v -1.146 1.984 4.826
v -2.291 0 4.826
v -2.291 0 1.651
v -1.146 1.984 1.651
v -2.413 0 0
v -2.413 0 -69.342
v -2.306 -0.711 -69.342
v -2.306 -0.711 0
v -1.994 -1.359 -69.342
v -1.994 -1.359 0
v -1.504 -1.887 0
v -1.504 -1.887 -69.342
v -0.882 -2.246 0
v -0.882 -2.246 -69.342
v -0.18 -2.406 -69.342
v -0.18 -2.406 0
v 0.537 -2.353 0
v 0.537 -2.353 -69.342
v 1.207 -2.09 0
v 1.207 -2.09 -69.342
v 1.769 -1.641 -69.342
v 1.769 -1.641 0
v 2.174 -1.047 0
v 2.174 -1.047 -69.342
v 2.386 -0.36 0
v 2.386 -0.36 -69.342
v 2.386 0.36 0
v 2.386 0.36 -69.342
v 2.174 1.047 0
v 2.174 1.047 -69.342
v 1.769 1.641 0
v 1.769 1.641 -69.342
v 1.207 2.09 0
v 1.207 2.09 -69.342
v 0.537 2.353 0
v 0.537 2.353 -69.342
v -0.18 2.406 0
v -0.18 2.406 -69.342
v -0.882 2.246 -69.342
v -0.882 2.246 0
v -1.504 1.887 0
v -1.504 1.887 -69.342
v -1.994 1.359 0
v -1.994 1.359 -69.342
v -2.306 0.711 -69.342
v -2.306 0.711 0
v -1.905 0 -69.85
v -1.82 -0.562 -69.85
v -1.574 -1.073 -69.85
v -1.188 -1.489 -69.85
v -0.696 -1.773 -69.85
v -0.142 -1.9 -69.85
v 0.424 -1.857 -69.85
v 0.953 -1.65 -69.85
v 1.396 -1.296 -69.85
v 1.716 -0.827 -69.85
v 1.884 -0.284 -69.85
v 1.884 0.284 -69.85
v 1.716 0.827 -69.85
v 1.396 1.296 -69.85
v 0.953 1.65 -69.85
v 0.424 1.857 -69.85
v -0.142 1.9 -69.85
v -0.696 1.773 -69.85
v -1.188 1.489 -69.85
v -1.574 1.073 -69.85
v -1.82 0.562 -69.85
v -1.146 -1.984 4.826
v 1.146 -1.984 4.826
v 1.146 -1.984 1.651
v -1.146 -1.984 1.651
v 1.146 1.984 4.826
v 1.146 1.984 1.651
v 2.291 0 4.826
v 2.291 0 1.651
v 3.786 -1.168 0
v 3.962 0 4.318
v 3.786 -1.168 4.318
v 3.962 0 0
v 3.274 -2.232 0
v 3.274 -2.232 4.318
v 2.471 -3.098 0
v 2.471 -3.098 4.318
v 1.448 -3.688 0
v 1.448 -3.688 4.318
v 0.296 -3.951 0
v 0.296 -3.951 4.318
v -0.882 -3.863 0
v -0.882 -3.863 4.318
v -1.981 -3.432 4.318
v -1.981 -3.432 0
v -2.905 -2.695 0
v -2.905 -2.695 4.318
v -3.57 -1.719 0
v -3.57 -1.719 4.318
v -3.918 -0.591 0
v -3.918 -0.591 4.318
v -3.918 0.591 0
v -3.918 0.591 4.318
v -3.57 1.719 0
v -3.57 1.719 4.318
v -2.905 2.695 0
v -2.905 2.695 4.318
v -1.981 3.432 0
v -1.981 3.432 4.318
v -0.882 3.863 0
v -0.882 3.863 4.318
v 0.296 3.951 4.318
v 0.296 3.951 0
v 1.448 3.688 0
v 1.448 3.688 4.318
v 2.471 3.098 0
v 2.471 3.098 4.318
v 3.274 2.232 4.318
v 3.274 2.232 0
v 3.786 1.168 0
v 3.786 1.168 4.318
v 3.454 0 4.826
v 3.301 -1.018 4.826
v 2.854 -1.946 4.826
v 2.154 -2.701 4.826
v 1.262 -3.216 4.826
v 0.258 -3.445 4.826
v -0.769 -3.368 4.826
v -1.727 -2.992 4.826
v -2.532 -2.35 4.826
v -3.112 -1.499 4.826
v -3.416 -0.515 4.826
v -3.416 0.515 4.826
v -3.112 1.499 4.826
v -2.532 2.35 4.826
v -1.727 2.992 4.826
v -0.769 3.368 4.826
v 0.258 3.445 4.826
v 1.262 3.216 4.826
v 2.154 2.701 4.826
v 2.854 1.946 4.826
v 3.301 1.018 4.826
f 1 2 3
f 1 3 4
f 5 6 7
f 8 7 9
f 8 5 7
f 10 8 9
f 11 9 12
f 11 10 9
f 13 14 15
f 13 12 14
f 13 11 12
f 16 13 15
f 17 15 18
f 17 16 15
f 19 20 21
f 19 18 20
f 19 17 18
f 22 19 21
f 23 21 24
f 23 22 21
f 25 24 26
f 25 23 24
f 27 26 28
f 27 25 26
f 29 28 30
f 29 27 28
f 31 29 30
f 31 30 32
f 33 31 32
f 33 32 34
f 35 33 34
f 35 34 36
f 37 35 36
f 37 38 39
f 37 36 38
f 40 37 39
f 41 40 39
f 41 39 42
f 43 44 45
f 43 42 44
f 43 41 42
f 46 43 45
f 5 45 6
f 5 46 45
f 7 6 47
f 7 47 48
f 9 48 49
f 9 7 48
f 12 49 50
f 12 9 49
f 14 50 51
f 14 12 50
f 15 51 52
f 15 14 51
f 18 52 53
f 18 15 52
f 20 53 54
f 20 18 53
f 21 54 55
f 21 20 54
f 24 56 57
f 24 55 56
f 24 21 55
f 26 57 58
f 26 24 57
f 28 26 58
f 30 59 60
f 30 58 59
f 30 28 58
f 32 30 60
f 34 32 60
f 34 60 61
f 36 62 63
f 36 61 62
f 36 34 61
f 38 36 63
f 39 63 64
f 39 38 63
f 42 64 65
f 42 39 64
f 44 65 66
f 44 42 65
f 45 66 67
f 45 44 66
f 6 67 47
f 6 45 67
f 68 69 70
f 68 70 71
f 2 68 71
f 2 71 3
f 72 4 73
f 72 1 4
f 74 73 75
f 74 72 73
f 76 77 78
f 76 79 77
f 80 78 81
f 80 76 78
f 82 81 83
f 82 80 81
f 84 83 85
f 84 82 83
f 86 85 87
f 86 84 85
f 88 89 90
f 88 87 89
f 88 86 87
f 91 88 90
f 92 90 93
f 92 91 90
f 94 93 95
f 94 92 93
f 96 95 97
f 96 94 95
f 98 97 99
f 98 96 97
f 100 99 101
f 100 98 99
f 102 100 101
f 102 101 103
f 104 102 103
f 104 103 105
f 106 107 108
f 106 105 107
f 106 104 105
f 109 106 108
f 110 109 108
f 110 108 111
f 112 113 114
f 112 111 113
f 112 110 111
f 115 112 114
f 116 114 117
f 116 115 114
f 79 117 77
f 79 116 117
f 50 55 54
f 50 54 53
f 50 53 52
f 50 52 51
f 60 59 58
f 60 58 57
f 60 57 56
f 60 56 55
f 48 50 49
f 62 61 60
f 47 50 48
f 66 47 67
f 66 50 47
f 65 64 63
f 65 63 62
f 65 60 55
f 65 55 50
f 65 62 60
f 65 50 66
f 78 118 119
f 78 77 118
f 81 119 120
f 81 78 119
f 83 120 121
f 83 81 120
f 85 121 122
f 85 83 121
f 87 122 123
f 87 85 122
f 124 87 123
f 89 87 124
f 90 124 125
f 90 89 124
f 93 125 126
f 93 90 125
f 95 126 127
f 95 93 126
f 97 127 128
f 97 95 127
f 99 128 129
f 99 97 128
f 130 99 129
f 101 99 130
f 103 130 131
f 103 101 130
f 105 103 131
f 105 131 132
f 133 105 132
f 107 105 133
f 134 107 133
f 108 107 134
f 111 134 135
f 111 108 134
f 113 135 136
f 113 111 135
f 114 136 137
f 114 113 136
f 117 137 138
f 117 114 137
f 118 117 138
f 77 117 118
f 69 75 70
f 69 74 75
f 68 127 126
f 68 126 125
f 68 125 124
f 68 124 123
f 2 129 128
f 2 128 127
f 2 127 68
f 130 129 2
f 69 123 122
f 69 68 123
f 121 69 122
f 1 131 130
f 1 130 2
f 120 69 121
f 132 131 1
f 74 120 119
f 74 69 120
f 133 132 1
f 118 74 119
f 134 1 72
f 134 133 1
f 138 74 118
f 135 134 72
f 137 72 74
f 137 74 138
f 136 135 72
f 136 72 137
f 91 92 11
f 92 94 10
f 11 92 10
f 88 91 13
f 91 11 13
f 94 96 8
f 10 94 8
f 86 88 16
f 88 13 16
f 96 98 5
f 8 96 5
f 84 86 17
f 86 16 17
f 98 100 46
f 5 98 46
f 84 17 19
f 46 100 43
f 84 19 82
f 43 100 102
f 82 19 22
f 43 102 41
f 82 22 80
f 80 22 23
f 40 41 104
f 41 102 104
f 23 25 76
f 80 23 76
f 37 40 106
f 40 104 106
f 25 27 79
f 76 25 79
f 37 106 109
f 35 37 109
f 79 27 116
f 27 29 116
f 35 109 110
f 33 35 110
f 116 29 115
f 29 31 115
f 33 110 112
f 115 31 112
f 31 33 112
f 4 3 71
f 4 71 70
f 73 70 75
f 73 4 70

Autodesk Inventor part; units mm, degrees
ref_plane "YZ Plane" through (0, 0, 0) normal (1, 0, 0) x (0, 1, 0)
ref_plane "XZ Plane" through (0, 0, 0) normal (0, 1, 0) x (-1, 0, 0)
ref_plane "XY Plane" through (0, 0, 0) normal (0, 0, 1) x (1, 0, 0)
sketch "Sketch1" plane through (0, 0, 0) normal (0, 0, 1) x (1, 0, 0)
  circle A0 centre (0, 0) radius 3.9624
  dimension "d0" = 7.9248
extrude "Extrusion1" add sketch "Sketch1" along normal blind 4.826
sketch "Sketch2" plane through (0, 0, 0) normal (0, 0, -1) x (-1, 0, 0)
  circle A0 centre (0, 0) radius 3.9624 projected
  circle A1 centre (0, 0) radius 2.413
  dimension "d3" = 4.826
extrude "Extrusion2" add sketch "Sketch2" along normal blind 69.85 contours A1
sketch "Sketch3" plane through (0, 0, 4.826) normal (0, 0, 1) x (1, 0, 0)
  circle A0 centre (0, 0) radius 3.9624 projected
  line L0 (-1.1457, 1.9844) -> (1.1457, 1.9844)
  line L1 (1.1457, 1.9844) -> (2.2914, 0)
  line L2 (2.2914, 0) -> (1.1457, -1.9844)
  line L3 (1.1457, -1.9844) -> (-1.1457, -1.9844)
  line L4 (-1.1457, -1.9844) -> (-2.2914, 0)
  line L5 (-2.2914, 0) -> (-1.1457, 1.9844)
  dimension "d6" = 3.9688
extrude "Extrusion3" cut sketch "Sketch3" against normal blind 3.175 contours L0 L1 L2 L3 L4 L5
thread "Thread1" size "10-32 UNF" class "2A" standard "ANSI Unified Screw Threads" length 25.4
chamfer "Chamfer1" distance 0.508 angle 45 1 edges at (2.413, 0, -69.85)
chamfer "Chamfer2" distance 0.508 angle 45 1 edges at (-3.9624, 0, 4.826)
properties part number "10-32 x1000" material "Steel"
